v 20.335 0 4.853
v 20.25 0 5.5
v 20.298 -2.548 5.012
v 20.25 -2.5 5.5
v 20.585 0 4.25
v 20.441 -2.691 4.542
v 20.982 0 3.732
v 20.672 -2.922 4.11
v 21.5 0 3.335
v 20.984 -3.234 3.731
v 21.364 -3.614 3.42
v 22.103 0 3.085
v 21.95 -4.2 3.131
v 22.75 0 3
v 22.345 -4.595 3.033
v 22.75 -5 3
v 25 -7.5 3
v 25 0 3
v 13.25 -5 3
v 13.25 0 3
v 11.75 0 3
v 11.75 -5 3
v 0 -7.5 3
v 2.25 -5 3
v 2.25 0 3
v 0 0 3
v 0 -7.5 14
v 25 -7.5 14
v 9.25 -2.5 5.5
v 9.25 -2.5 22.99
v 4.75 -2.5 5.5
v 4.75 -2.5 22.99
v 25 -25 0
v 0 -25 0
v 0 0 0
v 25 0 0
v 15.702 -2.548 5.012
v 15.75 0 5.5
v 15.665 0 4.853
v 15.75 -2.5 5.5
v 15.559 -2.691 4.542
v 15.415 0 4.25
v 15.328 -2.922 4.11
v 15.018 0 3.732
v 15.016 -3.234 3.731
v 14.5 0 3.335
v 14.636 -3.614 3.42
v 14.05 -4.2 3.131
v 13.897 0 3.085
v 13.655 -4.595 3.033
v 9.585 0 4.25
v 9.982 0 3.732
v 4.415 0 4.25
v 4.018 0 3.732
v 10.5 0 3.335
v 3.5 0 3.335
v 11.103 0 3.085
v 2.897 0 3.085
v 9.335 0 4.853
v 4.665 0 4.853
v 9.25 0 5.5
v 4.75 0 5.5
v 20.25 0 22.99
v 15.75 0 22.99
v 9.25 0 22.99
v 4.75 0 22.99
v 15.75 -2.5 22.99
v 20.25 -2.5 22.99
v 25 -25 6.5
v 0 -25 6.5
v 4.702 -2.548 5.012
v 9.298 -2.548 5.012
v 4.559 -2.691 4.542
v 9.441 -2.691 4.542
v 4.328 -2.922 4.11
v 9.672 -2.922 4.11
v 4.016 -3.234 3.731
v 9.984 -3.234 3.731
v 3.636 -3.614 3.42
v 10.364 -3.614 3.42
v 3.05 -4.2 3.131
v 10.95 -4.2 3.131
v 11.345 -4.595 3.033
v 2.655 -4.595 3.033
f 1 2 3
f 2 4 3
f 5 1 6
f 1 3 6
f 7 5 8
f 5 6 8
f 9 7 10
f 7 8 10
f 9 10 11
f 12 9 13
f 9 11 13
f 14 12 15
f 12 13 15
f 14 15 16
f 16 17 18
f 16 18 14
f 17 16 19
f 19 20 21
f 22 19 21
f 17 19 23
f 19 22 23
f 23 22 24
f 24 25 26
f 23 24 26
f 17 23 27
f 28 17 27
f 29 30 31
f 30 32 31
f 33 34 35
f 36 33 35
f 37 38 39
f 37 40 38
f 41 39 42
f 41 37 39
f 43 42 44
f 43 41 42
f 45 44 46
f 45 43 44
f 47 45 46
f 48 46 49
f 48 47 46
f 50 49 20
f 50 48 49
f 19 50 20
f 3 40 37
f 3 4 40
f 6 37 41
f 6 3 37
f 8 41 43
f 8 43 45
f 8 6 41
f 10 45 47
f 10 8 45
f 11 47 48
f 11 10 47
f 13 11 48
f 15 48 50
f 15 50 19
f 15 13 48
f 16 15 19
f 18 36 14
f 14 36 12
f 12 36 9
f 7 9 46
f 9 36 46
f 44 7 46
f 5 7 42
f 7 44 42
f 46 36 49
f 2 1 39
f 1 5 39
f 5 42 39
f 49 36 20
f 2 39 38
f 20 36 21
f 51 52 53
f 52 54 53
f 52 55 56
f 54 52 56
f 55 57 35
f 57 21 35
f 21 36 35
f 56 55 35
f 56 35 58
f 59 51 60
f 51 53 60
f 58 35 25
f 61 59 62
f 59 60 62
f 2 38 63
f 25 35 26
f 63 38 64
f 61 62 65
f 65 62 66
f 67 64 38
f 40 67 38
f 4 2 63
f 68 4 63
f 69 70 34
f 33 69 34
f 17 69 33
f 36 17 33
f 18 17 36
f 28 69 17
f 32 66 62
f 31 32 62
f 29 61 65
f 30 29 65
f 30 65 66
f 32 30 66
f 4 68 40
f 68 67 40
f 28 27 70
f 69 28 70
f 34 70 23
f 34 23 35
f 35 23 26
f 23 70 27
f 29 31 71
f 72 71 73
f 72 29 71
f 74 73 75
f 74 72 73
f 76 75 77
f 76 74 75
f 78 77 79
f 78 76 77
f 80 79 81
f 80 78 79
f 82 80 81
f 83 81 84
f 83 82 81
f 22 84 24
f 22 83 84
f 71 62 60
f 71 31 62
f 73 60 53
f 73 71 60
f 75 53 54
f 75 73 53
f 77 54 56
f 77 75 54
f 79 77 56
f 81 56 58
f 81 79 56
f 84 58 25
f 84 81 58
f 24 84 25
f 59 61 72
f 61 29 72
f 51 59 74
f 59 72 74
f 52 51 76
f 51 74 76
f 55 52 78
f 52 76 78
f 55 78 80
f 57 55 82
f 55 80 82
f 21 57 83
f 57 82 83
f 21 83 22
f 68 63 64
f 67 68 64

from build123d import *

# Parameters (mm, degrees)
F1_DEPTH = 25
F3_DEPTH = 2.5
F4_R     = 2.5


with BuildPart() as f1:
    # F0 (on Right) → F1 (new body)
    with BuildSketch(Plane.YZ):
        Polygon((0, 0), (0, 23), (-2.5, 23), (-2.5, 3), (-7.5, 3), (-7.5, 14), (-25, 6.5), (-25, 0), align=None)
    extrude(amount=F1_DEPTH)

    # F2 (on face) → F3 (cut, through all)
    with BuildSketch(Plane(origin=(0, 0, 0), x_dir=(-1, 0, 0), z_dir=(0, 1, 0))):
        Polygon((-25, 23), (-25, 3), (-20.25, 3), (-20.25, 22.99), (-15.75, 22.99), (-15.75, 3), (-12.5, 3), (-9.25, 3), (-9.25, 22.99), (-4.75, 22.99), (-4.75, 3), (0, 3), (0, 23), align=None)
    extrude(amount=-F3_DEPTH, mode=Mode.SUBTRACT)

    # F4
    f4_edges = [f1.edges().sort_by_distance(p)[0] for p in [
        (20.25, -1.25, 3),
        (18, -2.5, 3),
        (7, -2.5, 3),
        (9.25, -1.25, 3),
        (15.75, -1.25, 3),
        (4.75, -1.25, 3),
    ]]
    fillet(f4_edges, radius=F4_R)


solid = f1.part
